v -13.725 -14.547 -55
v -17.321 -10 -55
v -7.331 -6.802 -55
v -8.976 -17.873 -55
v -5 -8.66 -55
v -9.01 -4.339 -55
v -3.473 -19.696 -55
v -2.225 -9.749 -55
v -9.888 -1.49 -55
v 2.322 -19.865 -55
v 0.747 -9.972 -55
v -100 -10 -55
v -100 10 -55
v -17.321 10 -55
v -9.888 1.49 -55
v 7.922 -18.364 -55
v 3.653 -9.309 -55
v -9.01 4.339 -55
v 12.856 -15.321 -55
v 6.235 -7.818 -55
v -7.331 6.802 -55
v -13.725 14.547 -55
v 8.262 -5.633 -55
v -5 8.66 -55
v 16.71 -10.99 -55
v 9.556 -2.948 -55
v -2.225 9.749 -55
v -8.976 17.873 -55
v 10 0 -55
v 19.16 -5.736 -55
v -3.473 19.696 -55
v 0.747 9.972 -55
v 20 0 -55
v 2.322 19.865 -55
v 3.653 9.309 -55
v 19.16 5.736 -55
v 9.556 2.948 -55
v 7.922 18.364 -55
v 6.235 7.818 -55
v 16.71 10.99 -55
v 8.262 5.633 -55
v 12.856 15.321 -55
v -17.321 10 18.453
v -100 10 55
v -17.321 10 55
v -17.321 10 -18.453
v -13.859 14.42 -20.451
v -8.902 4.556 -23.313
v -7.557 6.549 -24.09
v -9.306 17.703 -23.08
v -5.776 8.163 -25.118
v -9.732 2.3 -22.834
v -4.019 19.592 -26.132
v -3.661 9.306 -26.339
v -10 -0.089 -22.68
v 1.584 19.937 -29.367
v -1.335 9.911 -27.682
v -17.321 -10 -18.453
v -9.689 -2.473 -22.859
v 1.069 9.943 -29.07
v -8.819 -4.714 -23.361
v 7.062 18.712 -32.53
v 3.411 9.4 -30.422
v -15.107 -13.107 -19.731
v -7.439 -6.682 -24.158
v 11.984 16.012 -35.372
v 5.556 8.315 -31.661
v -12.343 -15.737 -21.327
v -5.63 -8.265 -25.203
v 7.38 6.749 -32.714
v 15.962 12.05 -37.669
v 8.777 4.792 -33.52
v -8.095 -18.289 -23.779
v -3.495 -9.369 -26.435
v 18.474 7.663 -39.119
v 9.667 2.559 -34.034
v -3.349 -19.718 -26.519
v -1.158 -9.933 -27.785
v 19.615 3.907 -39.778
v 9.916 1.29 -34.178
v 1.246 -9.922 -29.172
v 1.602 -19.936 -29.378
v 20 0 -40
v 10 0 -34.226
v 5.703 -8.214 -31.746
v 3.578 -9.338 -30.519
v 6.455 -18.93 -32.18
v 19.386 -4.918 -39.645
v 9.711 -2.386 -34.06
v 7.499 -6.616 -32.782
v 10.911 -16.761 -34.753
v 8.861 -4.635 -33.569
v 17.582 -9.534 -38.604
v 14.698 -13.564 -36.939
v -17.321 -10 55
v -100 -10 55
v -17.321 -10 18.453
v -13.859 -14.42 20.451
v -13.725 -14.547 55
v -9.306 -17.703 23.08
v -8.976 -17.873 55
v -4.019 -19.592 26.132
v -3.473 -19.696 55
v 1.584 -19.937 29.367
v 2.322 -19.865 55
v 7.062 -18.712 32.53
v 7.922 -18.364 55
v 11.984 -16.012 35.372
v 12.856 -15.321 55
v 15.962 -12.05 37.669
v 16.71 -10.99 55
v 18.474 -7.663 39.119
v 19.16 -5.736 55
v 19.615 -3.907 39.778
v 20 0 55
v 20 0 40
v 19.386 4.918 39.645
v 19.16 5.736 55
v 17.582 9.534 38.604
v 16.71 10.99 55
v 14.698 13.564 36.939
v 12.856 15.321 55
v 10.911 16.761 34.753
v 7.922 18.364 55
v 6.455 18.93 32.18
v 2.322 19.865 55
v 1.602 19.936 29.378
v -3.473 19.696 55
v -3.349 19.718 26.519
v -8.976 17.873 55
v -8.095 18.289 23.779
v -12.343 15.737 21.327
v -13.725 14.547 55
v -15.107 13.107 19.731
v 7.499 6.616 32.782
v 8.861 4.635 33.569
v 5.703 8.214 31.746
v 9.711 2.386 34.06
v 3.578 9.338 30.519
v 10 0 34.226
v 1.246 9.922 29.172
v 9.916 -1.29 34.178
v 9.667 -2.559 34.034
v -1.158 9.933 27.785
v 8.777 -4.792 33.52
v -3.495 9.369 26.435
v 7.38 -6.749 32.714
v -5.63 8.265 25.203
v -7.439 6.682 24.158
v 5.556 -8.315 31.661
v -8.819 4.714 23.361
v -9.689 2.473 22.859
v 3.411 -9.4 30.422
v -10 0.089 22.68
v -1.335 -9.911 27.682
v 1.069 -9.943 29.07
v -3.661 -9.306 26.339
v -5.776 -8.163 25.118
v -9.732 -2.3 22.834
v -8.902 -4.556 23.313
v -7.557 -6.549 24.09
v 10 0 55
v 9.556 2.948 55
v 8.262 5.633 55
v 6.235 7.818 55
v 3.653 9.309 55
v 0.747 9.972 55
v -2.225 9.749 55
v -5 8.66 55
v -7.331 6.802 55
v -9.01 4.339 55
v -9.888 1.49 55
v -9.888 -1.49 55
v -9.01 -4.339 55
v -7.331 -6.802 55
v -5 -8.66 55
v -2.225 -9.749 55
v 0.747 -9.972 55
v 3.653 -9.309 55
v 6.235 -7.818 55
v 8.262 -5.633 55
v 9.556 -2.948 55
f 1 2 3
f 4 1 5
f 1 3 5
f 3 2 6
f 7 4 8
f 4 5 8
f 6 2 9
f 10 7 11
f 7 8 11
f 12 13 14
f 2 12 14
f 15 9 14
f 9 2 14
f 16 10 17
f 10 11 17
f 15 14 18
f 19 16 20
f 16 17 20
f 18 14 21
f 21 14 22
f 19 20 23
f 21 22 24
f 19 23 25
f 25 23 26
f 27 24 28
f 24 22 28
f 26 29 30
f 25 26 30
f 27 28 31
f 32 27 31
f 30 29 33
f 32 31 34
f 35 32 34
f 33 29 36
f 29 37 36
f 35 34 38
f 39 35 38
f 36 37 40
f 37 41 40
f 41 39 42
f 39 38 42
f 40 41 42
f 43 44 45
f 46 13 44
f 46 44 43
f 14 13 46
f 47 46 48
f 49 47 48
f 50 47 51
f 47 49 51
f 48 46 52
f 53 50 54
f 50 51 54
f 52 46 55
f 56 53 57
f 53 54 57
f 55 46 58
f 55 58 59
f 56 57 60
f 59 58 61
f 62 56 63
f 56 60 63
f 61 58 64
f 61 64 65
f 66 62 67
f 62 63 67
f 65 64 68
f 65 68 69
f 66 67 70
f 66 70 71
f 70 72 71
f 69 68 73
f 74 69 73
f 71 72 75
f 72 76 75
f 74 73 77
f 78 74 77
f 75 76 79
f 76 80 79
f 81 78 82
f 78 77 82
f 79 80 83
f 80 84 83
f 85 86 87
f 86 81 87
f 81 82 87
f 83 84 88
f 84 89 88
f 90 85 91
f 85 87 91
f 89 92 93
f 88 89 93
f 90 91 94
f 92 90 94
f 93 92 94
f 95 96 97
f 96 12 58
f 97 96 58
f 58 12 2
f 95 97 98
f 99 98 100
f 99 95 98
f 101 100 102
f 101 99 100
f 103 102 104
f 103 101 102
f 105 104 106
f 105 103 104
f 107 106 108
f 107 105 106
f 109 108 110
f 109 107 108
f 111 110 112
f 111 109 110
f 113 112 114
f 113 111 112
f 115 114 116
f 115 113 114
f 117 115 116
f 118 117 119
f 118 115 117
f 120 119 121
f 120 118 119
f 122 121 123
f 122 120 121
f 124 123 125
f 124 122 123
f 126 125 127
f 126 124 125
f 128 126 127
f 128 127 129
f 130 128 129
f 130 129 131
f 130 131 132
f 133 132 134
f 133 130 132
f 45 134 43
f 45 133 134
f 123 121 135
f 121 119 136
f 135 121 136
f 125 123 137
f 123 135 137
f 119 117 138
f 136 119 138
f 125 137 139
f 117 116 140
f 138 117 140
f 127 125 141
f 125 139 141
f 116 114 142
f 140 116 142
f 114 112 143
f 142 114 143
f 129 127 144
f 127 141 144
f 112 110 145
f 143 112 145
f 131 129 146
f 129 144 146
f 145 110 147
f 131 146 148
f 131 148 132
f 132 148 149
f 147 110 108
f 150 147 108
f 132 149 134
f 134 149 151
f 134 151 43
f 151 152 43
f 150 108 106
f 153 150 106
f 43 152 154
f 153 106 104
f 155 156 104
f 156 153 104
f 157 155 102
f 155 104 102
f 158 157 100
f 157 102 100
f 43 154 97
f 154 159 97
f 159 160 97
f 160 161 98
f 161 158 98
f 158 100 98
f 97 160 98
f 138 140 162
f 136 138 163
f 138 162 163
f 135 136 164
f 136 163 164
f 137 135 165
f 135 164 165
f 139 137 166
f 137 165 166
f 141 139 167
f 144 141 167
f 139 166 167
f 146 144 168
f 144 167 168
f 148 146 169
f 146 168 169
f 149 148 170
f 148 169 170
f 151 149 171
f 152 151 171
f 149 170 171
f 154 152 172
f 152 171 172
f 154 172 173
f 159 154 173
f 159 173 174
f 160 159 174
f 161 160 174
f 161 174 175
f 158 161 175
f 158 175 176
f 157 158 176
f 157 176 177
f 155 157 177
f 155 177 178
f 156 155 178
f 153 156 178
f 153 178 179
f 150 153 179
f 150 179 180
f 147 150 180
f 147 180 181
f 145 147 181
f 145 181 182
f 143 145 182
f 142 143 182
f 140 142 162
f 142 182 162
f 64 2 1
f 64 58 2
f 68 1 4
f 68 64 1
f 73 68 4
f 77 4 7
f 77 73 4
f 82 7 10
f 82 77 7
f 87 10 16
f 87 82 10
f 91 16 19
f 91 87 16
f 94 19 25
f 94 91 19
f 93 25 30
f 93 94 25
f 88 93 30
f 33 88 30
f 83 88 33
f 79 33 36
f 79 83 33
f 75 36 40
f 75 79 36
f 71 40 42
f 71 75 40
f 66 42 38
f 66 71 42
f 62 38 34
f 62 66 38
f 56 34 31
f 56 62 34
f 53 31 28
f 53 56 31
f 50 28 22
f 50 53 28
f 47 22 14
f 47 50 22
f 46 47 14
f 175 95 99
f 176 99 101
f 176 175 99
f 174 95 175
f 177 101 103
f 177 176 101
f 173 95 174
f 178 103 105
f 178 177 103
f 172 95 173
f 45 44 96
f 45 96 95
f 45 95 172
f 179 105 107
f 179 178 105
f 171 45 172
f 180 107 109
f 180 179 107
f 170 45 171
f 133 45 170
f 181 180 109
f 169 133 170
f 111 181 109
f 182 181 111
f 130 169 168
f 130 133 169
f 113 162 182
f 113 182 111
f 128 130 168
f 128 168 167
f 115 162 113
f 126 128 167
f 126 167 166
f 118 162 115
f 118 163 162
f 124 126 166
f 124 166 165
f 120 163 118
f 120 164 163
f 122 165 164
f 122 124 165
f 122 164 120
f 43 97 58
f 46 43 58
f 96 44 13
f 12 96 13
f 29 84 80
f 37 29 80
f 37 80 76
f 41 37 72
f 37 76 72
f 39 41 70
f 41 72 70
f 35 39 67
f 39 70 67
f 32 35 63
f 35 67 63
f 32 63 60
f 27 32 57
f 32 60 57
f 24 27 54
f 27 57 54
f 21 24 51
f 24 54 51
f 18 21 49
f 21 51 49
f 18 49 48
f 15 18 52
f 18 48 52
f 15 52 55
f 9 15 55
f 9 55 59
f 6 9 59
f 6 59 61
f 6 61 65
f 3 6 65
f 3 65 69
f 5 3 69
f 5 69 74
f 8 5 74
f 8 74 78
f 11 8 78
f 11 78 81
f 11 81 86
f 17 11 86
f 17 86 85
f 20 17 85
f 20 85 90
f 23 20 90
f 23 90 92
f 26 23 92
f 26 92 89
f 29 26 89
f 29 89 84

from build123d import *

# Parameters (mm, degrees)
SKETCH_1_R               = 20
EXTRUDE_1_DEPTH          = 55
SKETCH_2_W               = 100
SKETCH_2_H               = 110
EXTRUDE_2_DEPTH          = 10
SKETCH_3_R               = 10
CUT_EXTRUDE_1_DEPTH      = 151
CUT_EXTRUDE_3_DEPTH      = 119.004237212
CUT_EXTRUDE_3_DEPTH_BACK = 119.004237212


with BuildPart() as part:
    # 草图1 → 凸台-拉伸1 (new, symmetric)
    with BuildSketch(Plane.XY):
        Circle(SKETCH_1_R)
    extrude(amount=EXTRUDE_1_DEPTH, both=True)

    # 草图2 → 凸台-拉伸2 (add, symmetric)
    with BuildSketch(Plane(origin=(0, 0, 0), x_dir=(1, 0, 0), z_dir=(0, 1, 0))):
        with Locations((-50, 0)):
            Rectangle(SKETCH_2_W, SKETCH_2_H)
    extrude(amount=EXTRUDE_2_DEPTH, both=True)

    # 草图3 → 切除-拉伸1 (cut, through all)
    with BuildSketch(Plane.XY.offset(55)):
        Circle(SKETCH_3_R)
    extrude(amount=-CUT_EXTRUDE_1_DEPTH, mode=Mode.SUBTRACT)

    # 草图5 → 切除-拉伸3 (cut, two sides: drawn at the far end of the back side and taken through both)
    with BuildSketch(Plane(origin=(0, 10, 0), x_dir=(1, 0, 0), z_dir=(0, 1, 0)).offset(-CUT_EXTRUDE_3_DEPTH_BACK)):
        Polygon((20, -40), (-17.320508076, -18.452994616), (-17.320508076, 18.452994616), (20, 40), align=None)
    extrude(amount=CUT_EXTRUDE_3_DEPTH + CUT_EXTRUDE_3_DEPTH_BACK, mode=Mode.SUBTRACT)


solid = part.part
